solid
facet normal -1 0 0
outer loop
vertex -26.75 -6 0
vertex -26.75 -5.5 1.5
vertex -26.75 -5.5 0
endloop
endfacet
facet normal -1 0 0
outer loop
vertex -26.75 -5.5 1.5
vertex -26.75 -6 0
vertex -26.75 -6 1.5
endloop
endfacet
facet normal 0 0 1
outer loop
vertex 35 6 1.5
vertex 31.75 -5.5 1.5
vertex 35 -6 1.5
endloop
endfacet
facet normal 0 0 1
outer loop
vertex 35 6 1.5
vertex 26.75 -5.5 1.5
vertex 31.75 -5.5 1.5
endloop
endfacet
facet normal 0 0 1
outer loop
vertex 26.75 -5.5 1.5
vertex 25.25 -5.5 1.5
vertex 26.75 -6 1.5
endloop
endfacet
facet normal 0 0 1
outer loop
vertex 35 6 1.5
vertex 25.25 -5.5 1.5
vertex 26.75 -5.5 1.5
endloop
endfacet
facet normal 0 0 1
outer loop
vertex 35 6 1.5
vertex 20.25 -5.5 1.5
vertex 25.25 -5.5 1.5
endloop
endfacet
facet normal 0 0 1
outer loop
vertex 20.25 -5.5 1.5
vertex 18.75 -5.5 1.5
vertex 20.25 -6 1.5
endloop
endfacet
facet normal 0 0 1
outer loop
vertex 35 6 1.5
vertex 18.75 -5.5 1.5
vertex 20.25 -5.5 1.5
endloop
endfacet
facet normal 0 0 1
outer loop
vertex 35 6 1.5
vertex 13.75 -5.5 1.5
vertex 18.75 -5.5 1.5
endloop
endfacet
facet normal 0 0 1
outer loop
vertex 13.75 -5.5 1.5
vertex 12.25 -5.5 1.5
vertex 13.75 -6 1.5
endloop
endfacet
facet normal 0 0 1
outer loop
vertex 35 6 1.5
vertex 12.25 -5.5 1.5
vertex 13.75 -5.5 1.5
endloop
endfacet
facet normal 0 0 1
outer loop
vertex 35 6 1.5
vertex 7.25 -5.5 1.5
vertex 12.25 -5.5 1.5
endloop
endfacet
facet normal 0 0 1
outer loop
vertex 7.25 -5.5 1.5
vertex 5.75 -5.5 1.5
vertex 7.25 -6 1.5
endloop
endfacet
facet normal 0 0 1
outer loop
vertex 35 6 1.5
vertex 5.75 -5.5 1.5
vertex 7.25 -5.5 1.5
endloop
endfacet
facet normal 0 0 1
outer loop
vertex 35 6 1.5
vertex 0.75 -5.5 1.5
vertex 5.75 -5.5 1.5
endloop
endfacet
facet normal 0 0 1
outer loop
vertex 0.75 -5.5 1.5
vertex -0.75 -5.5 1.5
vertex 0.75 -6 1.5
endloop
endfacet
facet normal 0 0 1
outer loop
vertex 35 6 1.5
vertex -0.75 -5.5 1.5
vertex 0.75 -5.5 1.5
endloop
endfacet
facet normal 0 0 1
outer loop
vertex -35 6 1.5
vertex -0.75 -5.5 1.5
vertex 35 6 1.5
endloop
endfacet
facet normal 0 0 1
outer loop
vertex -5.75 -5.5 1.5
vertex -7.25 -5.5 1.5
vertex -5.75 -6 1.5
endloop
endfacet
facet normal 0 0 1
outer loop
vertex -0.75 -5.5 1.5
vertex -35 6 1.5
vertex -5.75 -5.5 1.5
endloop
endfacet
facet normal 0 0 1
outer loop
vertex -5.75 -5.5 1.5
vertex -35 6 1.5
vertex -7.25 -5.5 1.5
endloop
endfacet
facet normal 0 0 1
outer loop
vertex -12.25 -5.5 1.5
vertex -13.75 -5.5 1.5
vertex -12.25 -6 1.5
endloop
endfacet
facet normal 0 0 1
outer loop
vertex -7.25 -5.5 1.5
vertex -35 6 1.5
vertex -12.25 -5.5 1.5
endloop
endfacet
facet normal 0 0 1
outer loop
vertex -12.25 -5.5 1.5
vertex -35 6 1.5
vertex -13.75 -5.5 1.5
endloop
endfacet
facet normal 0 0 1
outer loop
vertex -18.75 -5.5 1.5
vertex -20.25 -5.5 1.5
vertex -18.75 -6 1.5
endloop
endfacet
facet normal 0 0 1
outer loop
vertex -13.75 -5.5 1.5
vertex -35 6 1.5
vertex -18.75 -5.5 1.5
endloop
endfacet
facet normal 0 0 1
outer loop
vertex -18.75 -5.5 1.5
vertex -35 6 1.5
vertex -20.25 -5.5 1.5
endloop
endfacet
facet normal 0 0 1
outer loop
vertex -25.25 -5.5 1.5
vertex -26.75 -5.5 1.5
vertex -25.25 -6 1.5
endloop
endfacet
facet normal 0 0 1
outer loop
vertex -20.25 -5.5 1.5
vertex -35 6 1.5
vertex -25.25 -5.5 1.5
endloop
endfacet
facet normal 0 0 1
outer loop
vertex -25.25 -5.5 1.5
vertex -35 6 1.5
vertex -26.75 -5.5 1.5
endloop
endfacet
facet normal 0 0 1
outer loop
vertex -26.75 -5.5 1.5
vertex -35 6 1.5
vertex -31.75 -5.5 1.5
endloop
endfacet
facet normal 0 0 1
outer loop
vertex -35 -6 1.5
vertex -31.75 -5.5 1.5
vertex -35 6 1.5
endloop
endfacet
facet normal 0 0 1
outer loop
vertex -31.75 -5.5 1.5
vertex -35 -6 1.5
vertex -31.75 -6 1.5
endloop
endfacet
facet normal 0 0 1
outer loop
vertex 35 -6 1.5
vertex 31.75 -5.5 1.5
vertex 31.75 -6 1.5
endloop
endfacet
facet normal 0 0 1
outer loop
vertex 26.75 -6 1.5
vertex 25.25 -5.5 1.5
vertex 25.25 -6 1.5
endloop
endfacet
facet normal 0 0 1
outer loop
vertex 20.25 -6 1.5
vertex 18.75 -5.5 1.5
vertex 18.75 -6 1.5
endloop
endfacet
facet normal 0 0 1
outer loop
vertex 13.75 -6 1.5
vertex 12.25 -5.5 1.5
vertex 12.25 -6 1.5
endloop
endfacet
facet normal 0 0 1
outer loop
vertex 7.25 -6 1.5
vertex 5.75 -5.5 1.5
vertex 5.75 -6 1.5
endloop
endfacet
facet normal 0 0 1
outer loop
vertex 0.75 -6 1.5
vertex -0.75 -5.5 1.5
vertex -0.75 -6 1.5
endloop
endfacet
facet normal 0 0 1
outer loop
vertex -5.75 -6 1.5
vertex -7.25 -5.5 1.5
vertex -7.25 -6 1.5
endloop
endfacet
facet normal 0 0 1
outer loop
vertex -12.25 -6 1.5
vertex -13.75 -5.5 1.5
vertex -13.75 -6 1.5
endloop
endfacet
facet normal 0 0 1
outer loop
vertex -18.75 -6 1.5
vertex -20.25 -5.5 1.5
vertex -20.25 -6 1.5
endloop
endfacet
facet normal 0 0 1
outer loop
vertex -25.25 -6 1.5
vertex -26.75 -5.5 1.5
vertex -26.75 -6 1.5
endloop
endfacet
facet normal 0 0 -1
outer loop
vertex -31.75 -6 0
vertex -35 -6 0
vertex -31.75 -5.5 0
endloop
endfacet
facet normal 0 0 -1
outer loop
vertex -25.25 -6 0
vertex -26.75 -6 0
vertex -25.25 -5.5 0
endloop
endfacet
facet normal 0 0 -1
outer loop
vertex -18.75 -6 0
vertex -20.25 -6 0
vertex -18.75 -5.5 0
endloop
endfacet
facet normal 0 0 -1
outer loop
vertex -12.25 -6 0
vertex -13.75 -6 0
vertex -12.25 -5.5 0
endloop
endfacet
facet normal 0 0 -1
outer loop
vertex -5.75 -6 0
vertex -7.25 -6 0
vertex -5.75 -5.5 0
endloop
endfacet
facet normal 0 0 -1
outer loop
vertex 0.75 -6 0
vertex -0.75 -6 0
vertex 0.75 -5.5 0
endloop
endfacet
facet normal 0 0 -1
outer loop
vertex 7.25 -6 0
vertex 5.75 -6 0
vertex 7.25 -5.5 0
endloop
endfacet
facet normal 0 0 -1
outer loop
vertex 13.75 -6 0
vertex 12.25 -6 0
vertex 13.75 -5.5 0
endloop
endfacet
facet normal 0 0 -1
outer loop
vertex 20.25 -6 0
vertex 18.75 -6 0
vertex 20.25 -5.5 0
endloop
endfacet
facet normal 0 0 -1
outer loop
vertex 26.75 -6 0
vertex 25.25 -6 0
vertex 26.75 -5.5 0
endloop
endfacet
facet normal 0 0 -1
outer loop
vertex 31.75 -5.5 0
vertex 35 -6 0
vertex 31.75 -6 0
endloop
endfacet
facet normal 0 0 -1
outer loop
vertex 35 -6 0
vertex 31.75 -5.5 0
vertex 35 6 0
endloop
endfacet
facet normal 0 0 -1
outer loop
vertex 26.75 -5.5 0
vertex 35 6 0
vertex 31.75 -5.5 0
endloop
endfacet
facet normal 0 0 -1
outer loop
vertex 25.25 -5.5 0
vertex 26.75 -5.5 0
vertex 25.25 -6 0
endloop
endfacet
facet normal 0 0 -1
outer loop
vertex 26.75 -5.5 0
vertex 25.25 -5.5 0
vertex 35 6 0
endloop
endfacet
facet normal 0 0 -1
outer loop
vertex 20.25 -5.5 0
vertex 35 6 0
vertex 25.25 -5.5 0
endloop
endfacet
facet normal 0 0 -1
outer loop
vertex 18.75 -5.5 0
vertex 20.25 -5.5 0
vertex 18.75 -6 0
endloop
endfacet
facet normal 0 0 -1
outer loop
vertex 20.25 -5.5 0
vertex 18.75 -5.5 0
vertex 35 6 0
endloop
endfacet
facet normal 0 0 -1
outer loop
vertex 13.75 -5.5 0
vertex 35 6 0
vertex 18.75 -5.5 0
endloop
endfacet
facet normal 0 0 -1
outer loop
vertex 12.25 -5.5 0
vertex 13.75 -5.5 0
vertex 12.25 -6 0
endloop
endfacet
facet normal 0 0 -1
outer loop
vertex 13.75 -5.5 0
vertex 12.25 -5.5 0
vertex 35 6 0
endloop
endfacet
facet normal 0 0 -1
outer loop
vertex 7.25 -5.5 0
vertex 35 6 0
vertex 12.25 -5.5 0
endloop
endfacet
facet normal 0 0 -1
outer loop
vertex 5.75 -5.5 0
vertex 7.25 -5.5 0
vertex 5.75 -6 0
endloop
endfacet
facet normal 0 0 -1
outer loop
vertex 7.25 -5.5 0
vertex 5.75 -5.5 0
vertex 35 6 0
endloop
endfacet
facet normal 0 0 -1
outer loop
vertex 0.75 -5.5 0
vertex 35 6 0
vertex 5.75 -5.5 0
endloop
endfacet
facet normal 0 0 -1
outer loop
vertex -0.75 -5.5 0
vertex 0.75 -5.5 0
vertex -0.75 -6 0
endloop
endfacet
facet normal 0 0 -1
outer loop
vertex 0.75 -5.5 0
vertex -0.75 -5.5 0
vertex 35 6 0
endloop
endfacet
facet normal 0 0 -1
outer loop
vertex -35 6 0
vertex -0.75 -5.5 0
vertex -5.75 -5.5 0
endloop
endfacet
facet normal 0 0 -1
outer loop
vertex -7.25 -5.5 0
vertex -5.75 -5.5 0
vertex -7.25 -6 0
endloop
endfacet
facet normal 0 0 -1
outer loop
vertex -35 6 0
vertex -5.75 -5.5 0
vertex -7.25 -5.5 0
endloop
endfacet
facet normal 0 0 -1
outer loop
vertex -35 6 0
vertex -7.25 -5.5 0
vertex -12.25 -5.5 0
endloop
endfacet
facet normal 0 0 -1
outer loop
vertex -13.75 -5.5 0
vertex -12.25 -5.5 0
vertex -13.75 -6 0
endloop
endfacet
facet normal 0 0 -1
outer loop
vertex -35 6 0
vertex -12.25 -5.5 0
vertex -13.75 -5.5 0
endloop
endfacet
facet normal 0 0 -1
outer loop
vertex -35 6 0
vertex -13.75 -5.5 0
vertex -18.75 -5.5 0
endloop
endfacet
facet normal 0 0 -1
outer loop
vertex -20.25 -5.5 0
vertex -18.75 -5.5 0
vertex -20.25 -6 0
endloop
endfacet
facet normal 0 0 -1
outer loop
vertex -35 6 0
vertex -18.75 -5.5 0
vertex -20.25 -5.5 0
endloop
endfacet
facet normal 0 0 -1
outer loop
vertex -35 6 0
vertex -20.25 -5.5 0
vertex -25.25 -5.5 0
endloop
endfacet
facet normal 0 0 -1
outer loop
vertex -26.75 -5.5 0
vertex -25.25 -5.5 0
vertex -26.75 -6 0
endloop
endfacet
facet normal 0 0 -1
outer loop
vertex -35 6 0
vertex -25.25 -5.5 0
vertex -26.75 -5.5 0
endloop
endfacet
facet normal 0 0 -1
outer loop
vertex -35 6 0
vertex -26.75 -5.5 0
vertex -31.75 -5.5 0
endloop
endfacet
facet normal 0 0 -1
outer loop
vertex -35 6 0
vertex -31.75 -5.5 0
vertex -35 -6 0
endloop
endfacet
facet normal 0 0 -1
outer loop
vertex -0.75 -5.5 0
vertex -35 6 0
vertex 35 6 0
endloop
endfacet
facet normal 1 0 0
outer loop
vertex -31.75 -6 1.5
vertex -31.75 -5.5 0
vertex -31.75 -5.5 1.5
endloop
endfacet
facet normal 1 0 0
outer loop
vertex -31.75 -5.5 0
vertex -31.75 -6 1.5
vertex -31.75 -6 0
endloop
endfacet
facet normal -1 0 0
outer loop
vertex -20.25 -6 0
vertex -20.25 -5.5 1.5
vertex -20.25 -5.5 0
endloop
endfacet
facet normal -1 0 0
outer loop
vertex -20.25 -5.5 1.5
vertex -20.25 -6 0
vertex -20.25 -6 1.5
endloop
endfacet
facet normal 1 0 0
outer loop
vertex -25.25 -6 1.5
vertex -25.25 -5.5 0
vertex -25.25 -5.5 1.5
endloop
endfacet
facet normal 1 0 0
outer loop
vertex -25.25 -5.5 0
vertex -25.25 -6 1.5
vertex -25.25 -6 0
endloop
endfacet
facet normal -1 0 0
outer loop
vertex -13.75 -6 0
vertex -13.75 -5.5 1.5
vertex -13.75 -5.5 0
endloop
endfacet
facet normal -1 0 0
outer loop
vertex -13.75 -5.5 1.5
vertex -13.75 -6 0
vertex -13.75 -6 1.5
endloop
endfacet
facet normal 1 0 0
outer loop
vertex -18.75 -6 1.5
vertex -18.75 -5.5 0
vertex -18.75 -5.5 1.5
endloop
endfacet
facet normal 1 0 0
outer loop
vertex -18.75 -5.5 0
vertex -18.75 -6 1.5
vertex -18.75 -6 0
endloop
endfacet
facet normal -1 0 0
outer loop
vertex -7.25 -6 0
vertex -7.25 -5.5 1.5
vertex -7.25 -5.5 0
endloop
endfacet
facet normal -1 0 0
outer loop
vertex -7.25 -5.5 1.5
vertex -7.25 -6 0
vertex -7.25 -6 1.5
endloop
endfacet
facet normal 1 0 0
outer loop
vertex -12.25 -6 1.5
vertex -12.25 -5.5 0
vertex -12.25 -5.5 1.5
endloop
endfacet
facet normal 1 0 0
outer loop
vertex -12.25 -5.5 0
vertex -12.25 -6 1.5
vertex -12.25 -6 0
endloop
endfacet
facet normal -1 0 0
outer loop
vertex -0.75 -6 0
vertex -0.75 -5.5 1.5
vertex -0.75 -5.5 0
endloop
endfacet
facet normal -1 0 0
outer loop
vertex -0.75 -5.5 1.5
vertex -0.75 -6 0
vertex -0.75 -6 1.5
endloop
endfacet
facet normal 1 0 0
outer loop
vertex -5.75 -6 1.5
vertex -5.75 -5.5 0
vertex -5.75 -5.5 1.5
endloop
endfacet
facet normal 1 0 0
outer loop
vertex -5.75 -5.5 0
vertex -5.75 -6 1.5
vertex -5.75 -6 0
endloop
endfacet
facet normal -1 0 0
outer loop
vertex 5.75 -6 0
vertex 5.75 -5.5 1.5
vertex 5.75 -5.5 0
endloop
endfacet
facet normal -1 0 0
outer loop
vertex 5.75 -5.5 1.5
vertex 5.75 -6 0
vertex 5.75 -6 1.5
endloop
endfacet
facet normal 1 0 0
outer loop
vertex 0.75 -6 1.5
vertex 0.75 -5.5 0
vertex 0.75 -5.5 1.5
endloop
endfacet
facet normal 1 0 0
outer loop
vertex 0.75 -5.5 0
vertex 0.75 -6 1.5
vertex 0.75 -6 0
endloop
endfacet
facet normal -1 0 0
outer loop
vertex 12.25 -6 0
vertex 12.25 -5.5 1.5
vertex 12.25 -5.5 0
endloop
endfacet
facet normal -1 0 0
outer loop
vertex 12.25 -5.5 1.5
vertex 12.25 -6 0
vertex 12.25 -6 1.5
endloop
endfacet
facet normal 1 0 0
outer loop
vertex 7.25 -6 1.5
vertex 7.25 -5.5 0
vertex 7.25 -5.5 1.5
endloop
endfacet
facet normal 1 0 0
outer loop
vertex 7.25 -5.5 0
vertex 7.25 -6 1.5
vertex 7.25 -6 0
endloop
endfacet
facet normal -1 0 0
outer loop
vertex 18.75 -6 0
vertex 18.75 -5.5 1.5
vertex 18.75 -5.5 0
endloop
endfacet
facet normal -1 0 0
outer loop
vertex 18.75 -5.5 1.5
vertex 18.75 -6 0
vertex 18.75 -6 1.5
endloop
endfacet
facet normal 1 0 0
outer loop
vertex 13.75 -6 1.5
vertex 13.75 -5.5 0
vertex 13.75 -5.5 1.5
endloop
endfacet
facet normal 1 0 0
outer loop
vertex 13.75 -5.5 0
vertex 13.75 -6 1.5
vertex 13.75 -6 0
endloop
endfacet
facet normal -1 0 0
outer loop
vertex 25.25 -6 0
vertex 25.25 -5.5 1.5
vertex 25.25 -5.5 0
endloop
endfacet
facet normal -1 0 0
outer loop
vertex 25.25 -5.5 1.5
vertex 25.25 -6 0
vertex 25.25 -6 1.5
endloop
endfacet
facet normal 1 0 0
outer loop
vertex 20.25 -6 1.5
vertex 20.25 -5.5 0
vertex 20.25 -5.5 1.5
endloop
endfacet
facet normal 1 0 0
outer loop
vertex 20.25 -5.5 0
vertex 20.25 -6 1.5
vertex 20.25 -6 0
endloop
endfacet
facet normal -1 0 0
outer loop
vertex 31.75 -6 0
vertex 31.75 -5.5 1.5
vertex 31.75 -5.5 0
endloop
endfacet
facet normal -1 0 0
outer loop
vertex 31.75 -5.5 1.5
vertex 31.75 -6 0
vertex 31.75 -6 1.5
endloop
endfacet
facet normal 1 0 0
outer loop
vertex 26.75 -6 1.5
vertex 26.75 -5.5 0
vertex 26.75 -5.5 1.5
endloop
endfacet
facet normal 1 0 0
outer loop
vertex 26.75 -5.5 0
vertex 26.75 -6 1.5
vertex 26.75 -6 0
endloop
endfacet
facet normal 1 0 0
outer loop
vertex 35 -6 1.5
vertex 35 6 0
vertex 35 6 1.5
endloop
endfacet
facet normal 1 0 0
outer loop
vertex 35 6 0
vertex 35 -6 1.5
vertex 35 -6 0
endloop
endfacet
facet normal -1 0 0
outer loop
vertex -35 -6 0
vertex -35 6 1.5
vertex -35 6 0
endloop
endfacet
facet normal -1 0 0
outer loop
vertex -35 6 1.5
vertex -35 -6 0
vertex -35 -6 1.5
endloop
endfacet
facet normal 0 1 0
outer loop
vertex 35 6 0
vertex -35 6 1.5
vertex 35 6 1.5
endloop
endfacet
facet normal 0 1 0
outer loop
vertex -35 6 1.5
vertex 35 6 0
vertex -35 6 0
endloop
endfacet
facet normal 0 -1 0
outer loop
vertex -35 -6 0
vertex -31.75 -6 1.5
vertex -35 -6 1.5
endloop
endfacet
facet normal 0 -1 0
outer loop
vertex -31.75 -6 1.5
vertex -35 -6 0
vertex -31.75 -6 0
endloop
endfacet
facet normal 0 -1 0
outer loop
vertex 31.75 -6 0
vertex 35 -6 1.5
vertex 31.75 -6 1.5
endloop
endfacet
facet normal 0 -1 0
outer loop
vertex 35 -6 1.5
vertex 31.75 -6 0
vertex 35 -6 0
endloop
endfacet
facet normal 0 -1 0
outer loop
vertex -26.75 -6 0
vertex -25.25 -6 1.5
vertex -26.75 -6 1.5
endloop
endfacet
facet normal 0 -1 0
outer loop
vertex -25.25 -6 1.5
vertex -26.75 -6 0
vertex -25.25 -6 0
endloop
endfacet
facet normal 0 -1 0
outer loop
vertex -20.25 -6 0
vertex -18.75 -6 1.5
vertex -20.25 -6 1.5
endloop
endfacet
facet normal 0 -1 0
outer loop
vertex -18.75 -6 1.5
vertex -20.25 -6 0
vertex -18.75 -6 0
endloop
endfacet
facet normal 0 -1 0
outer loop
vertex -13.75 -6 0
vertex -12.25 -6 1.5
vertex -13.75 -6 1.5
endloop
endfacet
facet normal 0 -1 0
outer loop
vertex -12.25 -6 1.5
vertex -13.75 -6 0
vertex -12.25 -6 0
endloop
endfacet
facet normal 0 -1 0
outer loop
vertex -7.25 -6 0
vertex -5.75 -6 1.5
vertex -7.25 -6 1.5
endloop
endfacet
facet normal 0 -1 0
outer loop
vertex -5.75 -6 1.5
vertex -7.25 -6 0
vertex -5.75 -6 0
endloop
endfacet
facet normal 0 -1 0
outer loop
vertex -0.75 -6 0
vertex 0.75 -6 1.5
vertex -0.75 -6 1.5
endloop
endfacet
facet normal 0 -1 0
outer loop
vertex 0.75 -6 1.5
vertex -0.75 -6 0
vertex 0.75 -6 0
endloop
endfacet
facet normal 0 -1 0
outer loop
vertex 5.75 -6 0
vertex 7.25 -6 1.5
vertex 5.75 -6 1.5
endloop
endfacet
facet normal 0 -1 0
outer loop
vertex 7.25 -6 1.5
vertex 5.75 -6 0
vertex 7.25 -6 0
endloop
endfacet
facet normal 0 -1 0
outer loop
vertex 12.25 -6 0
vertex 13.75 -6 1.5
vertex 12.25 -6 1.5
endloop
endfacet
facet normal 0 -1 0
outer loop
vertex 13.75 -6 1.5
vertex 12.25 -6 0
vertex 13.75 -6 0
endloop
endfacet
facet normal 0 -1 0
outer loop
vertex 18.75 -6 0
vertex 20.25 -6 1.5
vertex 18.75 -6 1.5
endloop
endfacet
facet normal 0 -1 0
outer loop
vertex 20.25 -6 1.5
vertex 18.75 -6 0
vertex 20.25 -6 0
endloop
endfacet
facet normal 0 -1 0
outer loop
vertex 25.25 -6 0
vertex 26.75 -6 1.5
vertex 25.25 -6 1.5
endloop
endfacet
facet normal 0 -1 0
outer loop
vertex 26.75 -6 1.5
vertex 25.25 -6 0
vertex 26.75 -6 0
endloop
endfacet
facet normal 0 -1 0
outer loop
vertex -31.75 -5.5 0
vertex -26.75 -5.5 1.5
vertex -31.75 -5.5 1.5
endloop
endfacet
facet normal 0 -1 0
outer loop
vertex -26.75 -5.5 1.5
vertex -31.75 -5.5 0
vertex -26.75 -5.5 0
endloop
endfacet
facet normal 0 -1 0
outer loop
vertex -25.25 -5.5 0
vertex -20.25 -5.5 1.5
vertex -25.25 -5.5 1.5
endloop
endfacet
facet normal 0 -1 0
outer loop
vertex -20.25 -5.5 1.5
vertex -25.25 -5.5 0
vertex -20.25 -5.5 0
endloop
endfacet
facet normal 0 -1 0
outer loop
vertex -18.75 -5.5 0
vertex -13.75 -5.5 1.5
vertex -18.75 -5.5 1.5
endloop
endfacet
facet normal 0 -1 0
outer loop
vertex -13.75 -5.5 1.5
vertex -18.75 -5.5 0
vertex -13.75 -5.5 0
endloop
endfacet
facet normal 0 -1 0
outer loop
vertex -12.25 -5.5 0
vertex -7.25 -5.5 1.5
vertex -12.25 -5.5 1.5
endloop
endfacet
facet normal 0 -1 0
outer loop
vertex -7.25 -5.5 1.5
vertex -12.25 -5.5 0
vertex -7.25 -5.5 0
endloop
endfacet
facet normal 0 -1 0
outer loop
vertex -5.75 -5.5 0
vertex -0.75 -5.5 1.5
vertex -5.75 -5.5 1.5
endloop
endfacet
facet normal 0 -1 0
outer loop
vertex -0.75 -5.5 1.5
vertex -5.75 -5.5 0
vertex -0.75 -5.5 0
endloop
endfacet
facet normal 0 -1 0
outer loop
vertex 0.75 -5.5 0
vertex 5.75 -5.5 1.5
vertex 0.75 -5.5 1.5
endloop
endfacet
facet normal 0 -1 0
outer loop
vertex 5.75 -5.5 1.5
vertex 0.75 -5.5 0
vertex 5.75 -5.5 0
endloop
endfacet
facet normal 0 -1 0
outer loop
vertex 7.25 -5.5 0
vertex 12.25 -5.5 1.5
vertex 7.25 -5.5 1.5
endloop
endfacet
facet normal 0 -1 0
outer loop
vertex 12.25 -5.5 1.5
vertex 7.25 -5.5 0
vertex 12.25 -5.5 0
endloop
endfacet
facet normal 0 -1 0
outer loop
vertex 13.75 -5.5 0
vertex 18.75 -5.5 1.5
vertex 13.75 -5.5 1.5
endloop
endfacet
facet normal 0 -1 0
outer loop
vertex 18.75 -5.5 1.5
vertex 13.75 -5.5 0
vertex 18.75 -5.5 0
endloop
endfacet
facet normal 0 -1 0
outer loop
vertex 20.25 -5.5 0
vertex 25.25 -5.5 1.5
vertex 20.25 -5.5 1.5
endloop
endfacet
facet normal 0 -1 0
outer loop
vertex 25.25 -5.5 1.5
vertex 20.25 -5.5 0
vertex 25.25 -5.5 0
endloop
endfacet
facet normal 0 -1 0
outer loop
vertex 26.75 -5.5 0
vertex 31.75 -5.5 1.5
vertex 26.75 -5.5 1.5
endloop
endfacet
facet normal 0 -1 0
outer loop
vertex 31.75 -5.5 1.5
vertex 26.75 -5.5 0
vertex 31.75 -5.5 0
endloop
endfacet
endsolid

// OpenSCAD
// Agarose gel casting comb - 10 wells
// Print orientation: flat on bed, teeth pointing down (-Y)

// ---------- Parameters ----------
plate_t      = 1.5;   // plate thickness (Z)
spine_l      = 70;    // spine length (X)
spine_w      = 12;    // spine width (Y)
tooth_w      = 5.0;   // tooth width (X)
tooth_l      = 12;    // tooth length (Y)
tooth_count  = 10;    // number of teeth
gap          = 1.5;   // gap between teeth (X)
overcut      = 0.5;   // extra length on cutters

$fn = 64;

pitch = tooth_w + gap;  // centre-to-centre tooth spacing

// ---------- Model ----------
difference() {
    union() {
        // Spine
        translate([-spine_l/2, -spine_w/2, 0])
            cube([spine_l, spine_w, plate_t]);

        // Teeth
        for (i = [0 : tooth_count - 1])
            translate([(i - (tooth_count - 1)/2) * pitch - tooth_w/2,
                       -spine_w/2 - tooth_l,
                       0])
                cube([tooth_w, tooth_l + plate_t, plate_t]);
    }

    // Tooth cutters (extend past -Y face)
    for (i = [0 : tooth_count - 1])
        translate([(i - (tooth_count - 1)/2) * pitch - tooth_w/2,
                   -spine_w/2 - tooth_l - overcut,
                   -overcut])
            cube([tooth_w, tooth_l + 2*overcut, plate_t + 2*overcut]);
}
